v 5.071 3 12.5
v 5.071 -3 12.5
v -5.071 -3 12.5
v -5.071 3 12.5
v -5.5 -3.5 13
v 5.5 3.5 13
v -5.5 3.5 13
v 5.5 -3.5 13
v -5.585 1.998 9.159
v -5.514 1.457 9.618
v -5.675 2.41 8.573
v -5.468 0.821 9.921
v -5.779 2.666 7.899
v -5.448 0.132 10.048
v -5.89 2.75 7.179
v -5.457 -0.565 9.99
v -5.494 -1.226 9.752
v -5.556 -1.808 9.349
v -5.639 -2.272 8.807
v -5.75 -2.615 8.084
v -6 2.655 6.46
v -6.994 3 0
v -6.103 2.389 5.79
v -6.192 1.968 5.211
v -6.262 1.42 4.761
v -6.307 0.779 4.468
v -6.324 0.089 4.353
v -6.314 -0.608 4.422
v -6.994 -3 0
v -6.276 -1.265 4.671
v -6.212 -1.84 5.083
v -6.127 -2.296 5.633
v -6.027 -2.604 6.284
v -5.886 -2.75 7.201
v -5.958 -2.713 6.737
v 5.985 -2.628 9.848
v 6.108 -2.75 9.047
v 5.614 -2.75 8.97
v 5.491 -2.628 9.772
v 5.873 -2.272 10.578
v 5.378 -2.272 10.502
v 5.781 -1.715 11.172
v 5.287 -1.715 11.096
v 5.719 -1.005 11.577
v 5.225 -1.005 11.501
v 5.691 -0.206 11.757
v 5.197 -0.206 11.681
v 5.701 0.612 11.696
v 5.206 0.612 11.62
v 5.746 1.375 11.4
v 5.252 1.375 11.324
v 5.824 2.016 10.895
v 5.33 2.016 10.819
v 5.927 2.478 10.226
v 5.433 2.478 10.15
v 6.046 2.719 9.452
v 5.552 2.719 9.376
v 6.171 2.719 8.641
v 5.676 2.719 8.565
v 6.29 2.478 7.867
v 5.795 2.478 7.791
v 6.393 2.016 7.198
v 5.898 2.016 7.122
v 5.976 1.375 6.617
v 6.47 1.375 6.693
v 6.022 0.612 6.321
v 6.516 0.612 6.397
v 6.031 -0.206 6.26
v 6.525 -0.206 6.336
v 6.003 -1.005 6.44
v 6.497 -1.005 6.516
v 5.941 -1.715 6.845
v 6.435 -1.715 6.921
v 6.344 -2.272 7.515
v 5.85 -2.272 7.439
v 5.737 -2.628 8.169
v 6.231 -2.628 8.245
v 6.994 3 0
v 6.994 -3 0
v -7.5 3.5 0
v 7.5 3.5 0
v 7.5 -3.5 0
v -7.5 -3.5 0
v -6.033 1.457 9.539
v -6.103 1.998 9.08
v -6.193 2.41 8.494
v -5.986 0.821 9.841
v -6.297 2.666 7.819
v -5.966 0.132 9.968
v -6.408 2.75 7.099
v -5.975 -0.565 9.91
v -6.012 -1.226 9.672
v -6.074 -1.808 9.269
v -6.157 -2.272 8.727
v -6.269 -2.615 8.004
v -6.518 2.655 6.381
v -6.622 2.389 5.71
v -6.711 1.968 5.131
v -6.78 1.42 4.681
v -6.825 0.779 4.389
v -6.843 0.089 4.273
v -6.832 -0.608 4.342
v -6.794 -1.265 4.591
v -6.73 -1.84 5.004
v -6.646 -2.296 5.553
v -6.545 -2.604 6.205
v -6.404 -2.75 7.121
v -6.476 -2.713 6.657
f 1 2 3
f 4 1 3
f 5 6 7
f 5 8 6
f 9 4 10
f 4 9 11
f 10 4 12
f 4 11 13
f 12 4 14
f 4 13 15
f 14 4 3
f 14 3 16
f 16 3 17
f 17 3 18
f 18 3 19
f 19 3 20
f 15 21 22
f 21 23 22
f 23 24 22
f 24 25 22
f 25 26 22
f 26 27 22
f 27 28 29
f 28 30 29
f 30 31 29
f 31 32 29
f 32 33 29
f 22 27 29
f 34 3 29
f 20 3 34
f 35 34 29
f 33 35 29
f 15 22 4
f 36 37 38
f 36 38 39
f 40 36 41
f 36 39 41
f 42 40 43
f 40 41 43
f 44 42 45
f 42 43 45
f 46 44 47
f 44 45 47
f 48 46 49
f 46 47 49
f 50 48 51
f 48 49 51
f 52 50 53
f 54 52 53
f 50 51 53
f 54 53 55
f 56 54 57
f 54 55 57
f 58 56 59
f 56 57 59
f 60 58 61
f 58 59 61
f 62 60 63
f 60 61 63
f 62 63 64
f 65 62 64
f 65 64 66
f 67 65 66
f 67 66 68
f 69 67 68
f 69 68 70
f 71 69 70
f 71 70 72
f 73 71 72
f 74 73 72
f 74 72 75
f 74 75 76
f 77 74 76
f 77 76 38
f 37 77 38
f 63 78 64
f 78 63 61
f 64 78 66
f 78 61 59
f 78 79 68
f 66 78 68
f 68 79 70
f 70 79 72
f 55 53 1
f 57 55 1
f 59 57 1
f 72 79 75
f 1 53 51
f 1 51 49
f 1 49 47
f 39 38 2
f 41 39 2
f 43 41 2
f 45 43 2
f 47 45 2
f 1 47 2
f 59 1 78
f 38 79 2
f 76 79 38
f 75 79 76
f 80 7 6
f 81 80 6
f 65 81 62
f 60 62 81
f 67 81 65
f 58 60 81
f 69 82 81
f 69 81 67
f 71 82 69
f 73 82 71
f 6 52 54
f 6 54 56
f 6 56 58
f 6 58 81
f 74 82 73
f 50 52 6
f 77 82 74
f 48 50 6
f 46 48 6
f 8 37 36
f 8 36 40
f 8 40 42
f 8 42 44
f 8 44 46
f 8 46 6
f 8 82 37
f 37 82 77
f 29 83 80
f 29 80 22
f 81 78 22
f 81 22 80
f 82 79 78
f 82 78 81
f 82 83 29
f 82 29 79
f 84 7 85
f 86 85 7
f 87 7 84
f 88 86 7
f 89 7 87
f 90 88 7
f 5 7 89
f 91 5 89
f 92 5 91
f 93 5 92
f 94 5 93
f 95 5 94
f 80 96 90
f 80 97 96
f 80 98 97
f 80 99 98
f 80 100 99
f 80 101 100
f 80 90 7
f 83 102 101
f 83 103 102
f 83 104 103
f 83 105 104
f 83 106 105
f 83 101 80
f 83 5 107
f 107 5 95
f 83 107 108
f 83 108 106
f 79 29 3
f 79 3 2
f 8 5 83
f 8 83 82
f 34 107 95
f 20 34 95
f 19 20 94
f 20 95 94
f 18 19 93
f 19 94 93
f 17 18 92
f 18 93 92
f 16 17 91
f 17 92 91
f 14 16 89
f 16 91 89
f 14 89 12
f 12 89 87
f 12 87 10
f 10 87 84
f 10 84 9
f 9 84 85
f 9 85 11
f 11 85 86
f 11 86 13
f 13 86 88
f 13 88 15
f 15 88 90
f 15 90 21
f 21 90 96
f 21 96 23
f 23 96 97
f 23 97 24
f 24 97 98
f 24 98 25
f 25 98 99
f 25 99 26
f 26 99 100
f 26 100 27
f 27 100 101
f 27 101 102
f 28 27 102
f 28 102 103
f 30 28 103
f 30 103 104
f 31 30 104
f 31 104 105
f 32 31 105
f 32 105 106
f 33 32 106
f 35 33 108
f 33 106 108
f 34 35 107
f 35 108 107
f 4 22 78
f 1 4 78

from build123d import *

# Parameters (mm, degrees)
F1_DEPTH = 3.5
F2_T     = -0.5
F4_D     = 5.5


with BuildPart() as f1:
    # F0 (on Front) → F1 (new body, symmetric)
    with BuildSketch(Plane.XZ):
        Polygon((-5.5, 13), (-7.5, 0), (7.5, 0), (5.5, 13), align=None)
    extrude(amount=F1_DEPTH, both=True)

    # F2
    f2_openings = [f1.faces().sort_by_distance(p)[0] for p in [
        (0, 0, 0),
    ]]
    offset(amount=F2_T, openings=f2_openings)

    # F4 (through all)
    with Locations(Plane(origin=(7.3265895954, 0, 1.1271676301), x_dir=(0, 1, 0), z_dir=(0.9883716977, 0, 0.1520571843))):
        with Locations((0, 8.0125175561)):
            Hole(F4_D / 2)


solid = f1.part
